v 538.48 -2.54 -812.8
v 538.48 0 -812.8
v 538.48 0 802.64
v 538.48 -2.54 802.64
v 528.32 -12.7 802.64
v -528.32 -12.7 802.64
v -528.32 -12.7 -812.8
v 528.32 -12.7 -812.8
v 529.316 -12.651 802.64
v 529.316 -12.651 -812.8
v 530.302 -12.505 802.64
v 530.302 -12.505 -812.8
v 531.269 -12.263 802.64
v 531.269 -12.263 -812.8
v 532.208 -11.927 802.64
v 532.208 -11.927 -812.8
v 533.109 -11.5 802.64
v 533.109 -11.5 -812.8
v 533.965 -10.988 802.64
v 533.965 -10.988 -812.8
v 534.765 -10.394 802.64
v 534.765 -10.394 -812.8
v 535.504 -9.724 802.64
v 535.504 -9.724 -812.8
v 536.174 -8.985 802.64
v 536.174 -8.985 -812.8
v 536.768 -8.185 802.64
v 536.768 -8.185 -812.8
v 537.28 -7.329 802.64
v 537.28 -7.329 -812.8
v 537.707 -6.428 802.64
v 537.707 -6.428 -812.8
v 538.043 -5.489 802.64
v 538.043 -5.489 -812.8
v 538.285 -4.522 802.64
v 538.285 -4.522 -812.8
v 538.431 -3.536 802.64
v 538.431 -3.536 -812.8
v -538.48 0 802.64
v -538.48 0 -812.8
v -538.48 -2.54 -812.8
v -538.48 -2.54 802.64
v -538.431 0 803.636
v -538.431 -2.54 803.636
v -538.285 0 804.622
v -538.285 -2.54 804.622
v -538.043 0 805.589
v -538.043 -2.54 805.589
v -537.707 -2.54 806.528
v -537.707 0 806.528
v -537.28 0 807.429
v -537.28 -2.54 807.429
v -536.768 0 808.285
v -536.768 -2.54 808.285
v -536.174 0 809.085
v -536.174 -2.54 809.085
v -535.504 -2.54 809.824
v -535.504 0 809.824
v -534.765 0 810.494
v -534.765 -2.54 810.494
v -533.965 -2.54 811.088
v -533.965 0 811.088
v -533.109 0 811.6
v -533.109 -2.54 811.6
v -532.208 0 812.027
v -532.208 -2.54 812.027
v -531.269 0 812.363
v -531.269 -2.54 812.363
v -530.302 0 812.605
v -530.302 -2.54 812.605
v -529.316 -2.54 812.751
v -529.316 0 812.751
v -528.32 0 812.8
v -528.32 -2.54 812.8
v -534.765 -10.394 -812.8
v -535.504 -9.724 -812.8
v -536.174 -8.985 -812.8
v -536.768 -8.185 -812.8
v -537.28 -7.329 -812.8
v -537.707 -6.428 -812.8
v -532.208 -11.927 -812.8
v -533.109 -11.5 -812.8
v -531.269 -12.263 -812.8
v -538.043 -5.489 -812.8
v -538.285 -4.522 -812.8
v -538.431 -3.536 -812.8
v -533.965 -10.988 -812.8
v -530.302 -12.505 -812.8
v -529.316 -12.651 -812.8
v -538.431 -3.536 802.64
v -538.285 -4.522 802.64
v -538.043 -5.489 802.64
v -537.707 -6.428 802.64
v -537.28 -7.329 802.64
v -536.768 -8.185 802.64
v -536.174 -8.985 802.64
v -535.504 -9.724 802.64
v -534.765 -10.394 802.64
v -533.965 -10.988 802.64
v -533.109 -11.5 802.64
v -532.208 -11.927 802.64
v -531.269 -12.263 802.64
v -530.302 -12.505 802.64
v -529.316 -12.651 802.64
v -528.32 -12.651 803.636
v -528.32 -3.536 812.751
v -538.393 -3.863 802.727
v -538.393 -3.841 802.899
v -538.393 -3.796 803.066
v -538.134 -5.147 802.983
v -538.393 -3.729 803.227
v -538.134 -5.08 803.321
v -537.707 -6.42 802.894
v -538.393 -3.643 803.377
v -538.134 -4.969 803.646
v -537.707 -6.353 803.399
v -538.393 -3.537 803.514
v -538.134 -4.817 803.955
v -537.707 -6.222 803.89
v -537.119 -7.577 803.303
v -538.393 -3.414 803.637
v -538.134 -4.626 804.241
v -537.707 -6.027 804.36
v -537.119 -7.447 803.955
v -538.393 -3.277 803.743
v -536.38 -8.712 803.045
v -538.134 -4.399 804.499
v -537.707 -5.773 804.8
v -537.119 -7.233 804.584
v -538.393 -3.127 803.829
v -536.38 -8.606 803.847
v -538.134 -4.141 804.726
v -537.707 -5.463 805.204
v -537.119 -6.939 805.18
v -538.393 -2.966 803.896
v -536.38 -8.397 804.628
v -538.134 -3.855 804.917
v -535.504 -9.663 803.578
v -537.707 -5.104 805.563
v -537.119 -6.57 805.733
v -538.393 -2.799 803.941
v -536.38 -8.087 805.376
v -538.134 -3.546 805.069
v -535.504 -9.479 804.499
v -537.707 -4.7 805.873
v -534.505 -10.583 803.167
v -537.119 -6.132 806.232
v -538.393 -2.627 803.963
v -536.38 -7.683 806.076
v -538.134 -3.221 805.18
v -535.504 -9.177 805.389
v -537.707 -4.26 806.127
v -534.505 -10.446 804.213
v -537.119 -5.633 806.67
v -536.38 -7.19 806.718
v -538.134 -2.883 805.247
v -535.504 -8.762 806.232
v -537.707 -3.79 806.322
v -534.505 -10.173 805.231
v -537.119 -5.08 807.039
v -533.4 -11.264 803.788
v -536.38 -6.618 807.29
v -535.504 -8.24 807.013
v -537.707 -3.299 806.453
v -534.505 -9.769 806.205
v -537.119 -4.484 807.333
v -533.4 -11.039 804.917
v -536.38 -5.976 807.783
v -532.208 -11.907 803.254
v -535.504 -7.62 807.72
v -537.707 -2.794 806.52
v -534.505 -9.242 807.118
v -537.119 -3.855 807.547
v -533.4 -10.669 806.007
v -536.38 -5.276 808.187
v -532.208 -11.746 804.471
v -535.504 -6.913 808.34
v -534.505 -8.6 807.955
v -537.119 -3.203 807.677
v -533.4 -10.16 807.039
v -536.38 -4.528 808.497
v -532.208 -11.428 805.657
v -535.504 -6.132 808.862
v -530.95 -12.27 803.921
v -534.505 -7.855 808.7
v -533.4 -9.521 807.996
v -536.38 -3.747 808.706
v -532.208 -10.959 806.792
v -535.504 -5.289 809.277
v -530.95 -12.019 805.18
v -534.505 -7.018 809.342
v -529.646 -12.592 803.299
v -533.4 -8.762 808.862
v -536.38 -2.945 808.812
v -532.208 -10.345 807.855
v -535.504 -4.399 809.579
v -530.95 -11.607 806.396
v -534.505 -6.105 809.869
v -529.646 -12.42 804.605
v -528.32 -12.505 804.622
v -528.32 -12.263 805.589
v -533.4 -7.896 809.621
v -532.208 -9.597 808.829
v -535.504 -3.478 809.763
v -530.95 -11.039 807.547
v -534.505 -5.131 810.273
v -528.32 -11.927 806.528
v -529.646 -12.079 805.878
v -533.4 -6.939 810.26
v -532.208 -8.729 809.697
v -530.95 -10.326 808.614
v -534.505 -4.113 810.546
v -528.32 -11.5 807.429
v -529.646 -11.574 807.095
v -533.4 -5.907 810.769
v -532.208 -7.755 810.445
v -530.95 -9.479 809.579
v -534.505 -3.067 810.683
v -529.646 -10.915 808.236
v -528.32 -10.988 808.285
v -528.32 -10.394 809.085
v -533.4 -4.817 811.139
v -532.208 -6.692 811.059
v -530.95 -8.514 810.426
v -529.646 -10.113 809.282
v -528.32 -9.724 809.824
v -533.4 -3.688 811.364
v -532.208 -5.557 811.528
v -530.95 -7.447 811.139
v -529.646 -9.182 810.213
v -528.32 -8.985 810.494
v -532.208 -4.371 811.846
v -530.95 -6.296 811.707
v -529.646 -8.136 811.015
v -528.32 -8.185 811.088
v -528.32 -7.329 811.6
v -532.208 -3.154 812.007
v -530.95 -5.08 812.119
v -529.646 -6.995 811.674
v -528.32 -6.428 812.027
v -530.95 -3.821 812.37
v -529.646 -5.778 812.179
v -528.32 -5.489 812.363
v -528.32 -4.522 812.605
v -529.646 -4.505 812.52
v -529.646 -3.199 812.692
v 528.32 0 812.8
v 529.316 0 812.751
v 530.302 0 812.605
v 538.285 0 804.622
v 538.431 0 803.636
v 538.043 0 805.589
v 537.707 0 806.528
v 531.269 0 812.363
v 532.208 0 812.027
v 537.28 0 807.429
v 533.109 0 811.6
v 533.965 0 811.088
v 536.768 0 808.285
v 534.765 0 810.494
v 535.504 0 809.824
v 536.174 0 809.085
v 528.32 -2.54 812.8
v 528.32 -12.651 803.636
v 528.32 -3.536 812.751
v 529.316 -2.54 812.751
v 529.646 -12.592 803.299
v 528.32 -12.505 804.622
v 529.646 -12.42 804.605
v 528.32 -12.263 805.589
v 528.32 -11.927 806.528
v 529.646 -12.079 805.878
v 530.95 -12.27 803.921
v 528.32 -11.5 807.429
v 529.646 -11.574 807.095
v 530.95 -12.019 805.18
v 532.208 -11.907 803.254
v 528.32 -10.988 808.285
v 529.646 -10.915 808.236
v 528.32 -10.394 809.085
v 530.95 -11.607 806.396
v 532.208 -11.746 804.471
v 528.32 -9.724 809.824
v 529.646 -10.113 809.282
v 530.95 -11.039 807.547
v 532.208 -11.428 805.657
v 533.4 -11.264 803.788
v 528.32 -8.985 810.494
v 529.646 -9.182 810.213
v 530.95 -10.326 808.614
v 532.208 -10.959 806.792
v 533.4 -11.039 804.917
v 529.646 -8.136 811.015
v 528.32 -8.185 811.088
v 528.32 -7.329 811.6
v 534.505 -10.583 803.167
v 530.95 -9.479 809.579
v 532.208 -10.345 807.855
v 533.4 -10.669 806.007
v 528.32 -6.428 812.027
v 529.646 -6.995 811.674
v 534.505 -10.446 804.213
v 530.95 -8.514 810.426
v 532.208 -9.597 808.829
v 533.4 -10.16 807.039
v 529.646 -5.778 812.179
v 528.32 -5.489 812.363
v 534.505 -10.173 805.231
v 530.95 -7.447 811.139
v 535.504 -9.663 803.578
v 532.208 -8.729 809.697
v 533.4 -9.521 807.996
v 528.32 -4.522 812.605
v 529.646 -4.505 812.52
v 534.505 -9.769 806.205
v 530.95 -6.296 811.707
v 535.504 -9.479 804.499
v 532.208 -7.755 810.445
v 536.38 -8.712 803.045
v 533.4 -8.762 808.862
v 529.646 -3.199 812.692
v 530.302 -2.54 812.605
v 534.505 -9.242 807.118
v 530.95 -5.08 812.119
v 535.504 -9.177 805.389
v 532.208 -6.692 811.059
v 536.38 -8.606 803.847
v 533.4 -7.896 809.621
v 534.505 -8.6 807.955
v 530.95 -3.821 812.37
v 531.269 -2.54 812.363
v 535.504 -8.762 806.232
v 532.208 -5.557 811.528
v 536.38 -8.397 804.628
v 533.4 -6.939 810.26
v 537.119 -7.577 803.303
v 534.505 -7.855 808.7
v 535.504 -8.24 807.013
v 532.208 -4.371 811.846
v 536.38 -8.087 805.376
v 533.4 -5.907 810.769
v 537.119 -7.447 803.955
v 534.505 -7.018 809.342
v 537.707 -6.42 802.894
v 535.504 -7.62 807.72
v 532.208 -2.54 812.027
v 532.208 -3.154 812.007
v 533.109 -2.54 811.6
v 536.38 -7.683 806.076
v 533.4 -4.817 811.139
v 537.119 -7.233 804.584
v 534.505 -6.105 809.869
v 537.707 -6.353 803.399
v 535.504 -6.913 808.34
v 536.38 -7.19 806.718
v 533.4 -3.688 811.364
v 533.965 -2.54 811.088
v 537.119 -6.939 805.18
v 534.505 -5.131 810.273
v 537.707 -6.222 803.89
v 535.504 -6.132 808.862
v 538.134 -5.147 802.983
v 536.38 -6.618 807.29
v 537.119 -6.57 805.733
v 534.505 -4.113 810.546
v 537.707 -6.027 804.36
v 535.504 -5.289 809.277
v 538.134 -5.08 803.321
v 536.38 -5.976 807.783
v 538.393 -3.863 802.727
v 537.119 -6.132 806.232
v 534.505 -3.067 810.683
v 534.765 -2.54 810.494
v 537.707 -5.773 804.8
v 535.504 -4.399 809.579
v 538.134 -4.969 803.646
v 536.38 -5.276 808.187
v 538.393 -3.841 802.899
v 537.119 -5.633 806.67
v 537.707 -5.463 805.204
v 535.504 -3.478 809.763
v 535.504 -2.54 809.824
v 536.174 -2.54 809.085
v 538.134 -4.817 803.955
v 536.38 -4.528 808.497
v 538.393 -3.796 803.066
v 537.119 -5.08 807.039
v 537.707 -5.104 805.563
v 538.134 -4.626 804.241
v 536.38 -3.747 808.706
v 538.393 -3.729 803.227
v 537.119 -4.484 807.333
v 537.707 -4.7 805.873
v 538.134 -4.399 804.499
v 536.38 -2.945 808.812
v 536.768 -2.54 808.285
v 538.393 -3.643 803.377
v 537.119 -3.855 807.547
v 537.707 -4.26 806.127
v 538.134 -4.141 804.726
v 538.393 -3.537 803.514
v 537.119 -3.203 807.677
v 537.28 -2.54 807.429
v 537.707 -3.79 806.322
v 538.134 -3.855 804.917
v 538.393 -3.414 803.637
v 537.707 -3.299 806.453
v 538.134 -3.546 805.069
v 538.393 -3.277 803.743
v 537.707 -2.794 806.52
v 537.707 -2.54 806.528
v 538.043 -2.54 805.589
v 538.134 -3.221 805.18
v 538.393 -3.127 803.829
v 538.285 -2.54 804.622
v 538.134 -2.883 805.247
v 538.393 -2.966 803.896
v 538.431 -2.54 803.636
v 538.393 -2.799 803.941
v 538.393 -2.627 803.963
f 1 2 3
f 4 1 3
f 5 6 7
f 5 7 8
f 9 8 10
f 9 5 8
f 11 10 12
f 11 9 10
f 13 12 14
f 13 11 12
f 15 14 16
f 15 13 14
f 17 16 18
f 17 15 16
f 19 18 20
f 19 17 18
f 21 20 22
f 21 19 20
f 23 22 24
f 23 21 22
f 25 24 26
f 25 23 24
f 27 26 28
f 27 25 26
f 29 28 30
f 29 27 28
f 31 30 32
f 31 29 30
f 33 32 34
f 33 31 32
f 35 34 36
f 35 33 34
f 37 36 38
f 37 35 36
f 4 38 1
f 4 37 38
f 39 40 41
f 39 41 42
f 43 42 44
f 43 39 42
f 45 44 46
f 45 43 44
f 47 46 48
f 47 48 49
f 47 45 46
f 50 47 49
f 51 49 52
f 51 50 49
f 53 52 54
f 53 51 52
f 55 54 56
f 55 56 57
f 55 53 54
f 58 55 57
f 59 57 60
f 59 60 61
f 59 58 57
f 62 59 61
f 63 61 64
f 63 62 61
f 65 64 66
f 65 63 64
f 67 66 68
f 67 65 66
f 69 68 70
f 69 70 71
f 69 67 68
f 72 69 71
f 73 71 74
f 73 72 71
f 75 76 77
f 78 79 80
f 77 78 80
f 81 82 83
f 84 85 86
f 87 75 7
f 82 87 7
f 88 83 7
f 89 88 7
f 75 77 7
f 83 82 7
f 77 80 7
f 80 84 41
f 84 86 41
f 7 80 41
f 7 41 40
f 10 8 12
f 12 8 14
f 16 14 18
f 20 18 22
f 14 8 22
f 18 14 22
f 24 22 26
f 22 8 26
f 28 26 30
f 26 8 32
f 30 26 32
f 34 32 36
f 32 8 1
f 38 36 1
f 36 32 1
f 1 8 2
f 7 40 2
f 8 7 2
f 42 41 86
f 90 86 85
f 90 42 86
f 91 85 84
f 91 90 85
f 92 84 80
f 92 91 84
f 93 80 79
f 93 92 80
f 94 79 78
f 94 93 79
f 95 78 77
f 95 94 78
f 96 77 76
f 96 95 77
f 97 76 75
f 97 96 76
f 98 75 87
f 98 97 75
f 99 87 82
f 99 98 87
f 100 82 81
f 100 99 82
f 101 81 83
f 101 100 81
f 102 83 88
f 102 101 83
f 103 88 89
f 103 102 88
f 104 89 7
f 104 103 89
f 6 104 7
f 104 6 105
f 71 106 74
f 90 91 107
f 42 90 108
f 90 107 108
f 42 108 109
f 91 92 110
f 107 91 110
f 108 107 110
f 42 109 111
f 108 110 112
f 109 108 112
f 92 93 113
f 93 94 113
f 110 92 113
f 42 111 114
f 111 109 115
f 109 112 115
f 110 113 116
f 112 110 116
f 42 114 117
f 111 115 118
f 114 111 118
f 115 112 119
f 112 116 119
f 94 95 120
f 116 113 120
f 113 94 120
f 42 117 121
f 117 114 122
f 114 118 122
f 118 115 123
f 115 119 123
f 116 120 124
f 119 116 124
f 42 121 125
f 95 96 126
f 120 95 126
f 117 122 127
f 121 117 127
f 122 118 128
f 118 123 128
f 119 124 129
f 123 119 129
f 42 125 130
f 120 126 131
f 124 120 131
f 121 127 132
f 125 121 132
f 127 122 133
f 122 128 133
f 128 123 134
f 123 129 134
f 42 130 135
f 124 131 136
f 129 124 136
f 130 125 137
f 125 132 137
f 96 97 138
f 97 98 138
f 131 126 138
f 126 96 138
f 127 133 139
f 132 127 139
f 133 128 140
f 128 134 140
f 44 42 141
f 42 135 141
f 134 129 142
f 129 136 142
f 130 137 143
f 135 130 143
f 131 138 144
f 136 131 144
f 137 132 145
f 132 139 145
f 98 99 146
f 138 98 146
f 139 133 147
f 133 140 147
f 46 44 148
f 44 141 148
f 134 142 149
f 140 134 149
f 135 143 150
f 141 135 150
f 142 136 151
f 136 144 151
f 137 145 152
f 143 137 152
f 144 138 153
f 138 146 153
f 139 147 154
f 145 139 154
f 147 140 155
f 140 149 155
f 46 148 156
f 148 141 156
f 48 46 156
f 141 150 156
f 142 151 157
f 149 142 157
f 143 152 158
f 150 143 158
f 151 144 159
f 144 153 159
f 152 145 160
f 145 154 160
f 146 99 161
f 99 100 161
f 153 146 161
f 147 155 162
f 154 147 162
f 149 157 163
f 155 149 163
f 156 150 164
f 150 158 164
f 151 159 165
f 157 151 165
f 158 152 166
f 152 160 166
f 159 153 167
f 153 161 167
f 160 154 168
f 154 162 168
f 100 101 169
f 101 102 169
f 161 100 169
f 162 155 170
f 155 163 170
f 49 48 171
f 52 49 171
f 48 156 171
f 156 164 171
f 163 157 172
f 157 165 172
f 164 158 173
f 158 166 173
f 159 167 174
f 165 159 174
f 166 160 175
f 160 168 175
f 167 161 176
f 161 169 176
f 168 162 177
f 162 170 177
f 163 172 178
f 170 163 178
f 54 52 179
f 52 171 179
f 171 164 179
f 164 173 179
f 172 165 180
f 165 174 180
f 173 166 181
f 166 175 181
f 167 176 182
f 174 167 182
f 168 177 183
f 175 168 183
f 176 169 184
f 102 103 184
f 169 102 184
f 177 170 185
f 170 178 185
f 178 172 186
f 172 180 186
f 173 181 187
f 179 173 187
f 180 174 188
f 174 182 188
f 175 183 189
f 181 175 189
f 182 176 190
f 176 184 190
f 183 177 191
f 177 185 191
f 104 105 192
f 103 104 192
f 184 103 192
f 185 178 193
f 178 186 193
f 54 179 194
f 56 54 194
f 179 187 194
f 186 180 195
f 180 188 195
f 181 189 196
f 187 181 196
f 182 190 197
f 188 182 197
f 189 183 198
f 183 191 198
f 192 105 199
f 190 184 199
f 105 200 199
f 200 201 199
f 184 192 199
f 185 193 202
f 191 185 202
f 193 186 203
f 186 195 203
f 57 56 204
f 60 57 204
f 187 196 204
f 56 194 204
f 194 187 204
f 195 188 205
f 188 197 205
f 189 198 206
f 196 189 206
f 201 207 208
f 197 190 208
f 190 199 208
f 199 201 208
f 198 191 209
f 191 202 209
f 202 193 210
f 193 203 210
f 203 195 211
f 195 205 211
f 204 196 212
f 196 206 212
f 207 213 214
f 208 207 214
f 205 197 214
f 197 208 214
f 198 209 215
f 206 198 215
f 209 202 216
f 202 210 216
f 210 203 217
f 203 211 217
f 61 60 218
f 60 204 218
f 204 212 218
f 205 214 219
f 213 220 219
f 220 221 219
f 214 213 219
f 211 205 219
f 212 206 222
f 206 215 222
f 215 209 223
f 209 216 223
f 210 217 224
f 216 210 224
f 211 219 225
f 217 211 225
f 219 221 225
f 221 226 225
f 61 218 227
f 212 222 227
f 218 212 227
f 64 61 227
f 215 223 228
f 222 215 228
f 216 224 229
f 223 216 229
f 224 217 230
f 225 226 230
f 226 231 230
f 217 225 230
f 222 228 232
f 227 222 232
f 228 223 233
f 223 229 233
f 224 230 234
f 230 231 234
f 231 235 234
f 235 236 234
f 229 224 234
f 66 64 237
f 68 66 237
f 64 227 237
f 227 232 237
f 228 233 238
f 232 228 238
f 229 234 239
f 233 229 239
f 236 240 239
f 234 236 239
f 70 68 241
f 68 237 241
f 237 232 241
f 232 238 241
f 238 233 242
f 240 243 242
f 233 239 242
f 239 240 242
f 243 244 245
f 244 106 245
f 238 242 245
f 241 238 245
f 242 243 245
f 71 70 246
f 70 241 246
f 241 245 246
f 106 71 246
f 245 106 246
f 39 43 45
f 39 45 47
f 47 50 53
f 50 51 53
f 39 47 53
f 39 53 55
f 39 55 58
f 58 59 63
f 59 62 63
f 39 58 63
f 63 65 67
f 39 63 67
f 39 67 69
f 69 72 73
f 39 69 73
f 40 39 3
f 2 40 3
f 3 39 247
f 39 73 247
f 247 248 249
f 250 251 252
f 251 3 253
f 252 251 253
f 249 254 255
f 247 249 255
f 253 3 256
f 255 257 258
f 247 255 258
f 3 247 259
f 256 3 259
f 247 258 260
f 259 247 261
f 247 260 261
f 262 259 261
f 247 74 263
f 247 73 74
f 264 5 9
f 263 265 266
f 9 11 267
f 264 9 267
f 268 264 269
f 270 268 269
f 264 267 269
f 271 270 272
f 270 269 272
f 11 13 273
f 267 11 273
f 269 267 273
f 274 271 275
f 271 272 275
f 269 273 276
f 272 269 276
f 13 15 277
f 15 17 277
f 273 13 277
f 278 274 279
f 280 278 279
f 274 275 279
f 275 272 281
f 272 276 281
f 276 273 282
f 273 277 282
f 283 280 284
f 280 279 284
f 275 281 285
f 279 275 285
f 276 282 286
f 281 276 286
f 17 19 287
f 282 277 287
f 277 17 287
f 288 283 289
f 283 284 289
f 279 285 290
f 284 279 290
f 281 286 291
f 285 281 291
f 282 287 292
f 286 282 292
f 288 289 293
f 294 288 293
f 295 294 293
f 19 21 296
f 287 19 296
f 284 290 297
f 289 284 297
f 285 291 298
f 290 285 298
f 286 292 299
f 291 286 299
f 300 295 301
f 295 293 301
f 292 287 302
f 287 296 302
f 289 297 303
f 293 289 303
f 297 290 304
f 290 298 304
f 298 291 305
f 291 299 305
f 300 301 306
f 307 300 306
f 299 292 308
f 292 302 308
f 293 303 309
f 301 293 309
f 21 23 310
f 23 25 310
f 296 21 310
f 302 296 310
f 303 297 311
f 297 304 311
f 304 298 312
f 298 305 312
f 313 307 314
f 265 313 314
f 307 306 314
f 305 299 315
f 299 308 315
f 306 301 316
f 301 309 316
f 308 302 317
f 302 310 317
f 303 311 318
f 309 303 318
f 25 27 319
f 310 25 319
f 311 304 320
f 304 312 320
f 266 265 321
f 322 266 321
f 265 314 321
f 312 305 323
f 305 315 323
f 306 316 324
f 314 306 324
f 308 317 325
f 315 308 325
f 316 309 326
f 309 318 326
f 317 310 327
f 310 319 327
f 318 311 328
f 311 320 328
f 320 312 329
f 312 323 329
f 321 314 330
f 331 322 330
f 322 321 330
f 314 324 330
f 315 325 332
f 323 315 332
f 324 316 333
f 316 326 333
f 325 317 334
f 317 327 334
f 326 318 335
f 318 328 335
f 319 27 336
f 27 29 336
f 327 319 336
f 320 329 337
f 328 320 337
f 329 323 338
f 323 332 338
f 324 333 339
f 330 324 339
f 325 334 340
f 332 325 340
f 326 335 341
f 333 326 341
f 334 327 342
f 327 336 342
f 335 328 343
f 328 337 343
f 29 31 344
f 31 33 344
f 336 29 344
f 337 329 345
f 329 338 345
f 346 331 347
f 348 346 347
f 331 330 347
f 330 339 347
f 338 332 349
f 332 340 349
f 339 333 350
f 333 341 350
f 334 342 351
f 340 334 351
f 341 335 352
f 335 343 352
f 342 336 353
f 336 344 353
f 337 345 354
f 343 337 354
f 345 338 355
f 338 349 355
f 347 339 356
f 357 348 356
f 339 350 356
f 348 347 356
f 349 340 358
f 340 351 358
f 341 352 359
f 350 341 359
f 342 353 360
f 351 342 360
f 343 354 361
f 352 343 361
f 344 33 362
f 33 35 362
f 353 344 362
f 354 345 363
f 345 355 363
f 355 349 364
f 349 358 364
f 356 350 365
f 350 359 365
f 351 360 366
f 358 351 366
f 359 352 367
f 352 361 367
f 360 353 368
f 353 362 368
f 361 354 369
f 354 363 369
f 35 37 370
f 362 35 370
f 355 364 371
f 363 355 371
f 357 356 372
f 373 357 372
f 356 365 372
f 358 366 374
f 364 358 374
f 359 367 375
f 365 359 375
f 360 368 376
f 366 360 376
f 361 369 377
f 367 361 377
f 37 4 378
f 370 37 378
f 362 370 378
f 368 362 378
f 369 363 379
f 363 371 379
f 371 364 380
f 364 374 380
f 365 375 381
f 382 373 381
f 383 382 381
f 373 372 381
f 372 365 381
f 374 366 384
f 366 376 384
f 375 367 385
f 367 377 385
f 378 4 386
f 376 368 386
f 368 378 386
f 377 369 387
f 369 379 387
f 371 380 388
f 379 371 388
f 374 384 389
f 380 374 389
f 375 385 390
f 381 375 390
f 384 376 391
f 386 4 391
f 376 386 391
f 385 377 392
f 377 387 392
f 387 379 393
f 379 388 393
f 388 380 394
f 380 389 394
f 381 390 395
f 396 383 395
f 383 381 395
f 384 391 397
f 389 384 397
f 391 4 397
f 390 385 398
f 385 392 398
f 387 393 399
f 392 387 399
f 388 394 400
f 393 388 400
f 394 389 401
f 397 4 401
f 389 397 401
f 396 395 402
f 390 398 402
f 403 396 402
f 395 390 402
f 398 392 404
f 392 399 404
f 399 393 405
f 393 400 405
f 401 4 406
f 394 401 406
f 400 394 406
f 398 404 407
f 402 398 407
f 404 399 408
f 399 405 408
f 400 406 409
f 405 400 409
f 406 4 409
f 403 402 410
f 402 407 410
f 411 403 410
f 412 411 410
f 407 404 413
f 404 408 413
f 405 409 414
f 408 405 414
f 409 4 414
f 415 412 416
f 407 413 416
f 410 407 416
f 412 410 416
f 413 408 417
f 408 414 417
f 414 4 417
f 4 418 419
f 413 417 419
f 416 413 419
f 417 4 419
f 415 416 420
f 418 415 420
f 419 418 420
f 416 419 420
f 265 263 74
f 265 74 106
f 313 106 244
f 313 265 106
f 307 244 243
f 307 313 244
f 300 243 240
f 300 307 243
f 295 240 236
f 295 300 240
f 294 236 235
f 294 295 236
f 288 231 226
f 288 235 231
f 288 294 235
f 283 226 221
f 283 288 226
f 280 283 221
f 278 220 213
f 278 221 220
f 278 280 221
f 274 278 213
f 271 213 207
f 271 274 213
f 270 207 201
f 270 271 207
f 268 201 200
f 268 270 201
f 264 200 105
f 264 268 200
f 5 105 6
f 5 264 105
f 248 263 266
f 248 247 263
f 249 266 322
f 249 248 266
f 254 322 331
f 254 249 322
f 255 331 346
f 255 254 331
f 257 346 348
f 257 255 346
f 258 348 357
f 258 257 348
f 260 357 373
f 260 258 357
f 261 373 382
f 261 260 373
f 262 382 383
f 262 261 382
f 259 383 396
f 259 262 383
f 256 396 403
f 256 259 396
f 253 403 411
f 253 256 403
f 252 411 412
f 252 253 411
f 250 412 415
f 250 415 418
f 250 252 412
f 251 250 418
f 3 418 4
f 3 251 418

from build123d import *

# Parameters (mm, degrees)
F0_W     = 1076.96
F0_H     = 1625.6
F1_DEPTH = 12.7
F2_R     = 10.16
F3_R     = 10.16


with BuildPart() as f1:
    # F0 (on Front) → F1 (new body)
    with BuildSketch(Plane.XZ):
        Rectangle(F0_W, F0_H)
    extrude(amount=F1_DEPTH)

    # F2
    f2_edges = [f1.edges().sort_by_distance(p)[0] for p in [
        (0, -12.7, 812.8),
    ]]
    fillet(f2_edges, radius=F2_R)

    # F3
    f3_edges = [f1.edges().sort_by_distance(p)[0] for p in [
        (538.48, -12.7, -5.08),
        (-538.48, -12.7, -5.08),
    ]]
    fillet(f3_edges, radius=F3_R)


solid = f1.part
